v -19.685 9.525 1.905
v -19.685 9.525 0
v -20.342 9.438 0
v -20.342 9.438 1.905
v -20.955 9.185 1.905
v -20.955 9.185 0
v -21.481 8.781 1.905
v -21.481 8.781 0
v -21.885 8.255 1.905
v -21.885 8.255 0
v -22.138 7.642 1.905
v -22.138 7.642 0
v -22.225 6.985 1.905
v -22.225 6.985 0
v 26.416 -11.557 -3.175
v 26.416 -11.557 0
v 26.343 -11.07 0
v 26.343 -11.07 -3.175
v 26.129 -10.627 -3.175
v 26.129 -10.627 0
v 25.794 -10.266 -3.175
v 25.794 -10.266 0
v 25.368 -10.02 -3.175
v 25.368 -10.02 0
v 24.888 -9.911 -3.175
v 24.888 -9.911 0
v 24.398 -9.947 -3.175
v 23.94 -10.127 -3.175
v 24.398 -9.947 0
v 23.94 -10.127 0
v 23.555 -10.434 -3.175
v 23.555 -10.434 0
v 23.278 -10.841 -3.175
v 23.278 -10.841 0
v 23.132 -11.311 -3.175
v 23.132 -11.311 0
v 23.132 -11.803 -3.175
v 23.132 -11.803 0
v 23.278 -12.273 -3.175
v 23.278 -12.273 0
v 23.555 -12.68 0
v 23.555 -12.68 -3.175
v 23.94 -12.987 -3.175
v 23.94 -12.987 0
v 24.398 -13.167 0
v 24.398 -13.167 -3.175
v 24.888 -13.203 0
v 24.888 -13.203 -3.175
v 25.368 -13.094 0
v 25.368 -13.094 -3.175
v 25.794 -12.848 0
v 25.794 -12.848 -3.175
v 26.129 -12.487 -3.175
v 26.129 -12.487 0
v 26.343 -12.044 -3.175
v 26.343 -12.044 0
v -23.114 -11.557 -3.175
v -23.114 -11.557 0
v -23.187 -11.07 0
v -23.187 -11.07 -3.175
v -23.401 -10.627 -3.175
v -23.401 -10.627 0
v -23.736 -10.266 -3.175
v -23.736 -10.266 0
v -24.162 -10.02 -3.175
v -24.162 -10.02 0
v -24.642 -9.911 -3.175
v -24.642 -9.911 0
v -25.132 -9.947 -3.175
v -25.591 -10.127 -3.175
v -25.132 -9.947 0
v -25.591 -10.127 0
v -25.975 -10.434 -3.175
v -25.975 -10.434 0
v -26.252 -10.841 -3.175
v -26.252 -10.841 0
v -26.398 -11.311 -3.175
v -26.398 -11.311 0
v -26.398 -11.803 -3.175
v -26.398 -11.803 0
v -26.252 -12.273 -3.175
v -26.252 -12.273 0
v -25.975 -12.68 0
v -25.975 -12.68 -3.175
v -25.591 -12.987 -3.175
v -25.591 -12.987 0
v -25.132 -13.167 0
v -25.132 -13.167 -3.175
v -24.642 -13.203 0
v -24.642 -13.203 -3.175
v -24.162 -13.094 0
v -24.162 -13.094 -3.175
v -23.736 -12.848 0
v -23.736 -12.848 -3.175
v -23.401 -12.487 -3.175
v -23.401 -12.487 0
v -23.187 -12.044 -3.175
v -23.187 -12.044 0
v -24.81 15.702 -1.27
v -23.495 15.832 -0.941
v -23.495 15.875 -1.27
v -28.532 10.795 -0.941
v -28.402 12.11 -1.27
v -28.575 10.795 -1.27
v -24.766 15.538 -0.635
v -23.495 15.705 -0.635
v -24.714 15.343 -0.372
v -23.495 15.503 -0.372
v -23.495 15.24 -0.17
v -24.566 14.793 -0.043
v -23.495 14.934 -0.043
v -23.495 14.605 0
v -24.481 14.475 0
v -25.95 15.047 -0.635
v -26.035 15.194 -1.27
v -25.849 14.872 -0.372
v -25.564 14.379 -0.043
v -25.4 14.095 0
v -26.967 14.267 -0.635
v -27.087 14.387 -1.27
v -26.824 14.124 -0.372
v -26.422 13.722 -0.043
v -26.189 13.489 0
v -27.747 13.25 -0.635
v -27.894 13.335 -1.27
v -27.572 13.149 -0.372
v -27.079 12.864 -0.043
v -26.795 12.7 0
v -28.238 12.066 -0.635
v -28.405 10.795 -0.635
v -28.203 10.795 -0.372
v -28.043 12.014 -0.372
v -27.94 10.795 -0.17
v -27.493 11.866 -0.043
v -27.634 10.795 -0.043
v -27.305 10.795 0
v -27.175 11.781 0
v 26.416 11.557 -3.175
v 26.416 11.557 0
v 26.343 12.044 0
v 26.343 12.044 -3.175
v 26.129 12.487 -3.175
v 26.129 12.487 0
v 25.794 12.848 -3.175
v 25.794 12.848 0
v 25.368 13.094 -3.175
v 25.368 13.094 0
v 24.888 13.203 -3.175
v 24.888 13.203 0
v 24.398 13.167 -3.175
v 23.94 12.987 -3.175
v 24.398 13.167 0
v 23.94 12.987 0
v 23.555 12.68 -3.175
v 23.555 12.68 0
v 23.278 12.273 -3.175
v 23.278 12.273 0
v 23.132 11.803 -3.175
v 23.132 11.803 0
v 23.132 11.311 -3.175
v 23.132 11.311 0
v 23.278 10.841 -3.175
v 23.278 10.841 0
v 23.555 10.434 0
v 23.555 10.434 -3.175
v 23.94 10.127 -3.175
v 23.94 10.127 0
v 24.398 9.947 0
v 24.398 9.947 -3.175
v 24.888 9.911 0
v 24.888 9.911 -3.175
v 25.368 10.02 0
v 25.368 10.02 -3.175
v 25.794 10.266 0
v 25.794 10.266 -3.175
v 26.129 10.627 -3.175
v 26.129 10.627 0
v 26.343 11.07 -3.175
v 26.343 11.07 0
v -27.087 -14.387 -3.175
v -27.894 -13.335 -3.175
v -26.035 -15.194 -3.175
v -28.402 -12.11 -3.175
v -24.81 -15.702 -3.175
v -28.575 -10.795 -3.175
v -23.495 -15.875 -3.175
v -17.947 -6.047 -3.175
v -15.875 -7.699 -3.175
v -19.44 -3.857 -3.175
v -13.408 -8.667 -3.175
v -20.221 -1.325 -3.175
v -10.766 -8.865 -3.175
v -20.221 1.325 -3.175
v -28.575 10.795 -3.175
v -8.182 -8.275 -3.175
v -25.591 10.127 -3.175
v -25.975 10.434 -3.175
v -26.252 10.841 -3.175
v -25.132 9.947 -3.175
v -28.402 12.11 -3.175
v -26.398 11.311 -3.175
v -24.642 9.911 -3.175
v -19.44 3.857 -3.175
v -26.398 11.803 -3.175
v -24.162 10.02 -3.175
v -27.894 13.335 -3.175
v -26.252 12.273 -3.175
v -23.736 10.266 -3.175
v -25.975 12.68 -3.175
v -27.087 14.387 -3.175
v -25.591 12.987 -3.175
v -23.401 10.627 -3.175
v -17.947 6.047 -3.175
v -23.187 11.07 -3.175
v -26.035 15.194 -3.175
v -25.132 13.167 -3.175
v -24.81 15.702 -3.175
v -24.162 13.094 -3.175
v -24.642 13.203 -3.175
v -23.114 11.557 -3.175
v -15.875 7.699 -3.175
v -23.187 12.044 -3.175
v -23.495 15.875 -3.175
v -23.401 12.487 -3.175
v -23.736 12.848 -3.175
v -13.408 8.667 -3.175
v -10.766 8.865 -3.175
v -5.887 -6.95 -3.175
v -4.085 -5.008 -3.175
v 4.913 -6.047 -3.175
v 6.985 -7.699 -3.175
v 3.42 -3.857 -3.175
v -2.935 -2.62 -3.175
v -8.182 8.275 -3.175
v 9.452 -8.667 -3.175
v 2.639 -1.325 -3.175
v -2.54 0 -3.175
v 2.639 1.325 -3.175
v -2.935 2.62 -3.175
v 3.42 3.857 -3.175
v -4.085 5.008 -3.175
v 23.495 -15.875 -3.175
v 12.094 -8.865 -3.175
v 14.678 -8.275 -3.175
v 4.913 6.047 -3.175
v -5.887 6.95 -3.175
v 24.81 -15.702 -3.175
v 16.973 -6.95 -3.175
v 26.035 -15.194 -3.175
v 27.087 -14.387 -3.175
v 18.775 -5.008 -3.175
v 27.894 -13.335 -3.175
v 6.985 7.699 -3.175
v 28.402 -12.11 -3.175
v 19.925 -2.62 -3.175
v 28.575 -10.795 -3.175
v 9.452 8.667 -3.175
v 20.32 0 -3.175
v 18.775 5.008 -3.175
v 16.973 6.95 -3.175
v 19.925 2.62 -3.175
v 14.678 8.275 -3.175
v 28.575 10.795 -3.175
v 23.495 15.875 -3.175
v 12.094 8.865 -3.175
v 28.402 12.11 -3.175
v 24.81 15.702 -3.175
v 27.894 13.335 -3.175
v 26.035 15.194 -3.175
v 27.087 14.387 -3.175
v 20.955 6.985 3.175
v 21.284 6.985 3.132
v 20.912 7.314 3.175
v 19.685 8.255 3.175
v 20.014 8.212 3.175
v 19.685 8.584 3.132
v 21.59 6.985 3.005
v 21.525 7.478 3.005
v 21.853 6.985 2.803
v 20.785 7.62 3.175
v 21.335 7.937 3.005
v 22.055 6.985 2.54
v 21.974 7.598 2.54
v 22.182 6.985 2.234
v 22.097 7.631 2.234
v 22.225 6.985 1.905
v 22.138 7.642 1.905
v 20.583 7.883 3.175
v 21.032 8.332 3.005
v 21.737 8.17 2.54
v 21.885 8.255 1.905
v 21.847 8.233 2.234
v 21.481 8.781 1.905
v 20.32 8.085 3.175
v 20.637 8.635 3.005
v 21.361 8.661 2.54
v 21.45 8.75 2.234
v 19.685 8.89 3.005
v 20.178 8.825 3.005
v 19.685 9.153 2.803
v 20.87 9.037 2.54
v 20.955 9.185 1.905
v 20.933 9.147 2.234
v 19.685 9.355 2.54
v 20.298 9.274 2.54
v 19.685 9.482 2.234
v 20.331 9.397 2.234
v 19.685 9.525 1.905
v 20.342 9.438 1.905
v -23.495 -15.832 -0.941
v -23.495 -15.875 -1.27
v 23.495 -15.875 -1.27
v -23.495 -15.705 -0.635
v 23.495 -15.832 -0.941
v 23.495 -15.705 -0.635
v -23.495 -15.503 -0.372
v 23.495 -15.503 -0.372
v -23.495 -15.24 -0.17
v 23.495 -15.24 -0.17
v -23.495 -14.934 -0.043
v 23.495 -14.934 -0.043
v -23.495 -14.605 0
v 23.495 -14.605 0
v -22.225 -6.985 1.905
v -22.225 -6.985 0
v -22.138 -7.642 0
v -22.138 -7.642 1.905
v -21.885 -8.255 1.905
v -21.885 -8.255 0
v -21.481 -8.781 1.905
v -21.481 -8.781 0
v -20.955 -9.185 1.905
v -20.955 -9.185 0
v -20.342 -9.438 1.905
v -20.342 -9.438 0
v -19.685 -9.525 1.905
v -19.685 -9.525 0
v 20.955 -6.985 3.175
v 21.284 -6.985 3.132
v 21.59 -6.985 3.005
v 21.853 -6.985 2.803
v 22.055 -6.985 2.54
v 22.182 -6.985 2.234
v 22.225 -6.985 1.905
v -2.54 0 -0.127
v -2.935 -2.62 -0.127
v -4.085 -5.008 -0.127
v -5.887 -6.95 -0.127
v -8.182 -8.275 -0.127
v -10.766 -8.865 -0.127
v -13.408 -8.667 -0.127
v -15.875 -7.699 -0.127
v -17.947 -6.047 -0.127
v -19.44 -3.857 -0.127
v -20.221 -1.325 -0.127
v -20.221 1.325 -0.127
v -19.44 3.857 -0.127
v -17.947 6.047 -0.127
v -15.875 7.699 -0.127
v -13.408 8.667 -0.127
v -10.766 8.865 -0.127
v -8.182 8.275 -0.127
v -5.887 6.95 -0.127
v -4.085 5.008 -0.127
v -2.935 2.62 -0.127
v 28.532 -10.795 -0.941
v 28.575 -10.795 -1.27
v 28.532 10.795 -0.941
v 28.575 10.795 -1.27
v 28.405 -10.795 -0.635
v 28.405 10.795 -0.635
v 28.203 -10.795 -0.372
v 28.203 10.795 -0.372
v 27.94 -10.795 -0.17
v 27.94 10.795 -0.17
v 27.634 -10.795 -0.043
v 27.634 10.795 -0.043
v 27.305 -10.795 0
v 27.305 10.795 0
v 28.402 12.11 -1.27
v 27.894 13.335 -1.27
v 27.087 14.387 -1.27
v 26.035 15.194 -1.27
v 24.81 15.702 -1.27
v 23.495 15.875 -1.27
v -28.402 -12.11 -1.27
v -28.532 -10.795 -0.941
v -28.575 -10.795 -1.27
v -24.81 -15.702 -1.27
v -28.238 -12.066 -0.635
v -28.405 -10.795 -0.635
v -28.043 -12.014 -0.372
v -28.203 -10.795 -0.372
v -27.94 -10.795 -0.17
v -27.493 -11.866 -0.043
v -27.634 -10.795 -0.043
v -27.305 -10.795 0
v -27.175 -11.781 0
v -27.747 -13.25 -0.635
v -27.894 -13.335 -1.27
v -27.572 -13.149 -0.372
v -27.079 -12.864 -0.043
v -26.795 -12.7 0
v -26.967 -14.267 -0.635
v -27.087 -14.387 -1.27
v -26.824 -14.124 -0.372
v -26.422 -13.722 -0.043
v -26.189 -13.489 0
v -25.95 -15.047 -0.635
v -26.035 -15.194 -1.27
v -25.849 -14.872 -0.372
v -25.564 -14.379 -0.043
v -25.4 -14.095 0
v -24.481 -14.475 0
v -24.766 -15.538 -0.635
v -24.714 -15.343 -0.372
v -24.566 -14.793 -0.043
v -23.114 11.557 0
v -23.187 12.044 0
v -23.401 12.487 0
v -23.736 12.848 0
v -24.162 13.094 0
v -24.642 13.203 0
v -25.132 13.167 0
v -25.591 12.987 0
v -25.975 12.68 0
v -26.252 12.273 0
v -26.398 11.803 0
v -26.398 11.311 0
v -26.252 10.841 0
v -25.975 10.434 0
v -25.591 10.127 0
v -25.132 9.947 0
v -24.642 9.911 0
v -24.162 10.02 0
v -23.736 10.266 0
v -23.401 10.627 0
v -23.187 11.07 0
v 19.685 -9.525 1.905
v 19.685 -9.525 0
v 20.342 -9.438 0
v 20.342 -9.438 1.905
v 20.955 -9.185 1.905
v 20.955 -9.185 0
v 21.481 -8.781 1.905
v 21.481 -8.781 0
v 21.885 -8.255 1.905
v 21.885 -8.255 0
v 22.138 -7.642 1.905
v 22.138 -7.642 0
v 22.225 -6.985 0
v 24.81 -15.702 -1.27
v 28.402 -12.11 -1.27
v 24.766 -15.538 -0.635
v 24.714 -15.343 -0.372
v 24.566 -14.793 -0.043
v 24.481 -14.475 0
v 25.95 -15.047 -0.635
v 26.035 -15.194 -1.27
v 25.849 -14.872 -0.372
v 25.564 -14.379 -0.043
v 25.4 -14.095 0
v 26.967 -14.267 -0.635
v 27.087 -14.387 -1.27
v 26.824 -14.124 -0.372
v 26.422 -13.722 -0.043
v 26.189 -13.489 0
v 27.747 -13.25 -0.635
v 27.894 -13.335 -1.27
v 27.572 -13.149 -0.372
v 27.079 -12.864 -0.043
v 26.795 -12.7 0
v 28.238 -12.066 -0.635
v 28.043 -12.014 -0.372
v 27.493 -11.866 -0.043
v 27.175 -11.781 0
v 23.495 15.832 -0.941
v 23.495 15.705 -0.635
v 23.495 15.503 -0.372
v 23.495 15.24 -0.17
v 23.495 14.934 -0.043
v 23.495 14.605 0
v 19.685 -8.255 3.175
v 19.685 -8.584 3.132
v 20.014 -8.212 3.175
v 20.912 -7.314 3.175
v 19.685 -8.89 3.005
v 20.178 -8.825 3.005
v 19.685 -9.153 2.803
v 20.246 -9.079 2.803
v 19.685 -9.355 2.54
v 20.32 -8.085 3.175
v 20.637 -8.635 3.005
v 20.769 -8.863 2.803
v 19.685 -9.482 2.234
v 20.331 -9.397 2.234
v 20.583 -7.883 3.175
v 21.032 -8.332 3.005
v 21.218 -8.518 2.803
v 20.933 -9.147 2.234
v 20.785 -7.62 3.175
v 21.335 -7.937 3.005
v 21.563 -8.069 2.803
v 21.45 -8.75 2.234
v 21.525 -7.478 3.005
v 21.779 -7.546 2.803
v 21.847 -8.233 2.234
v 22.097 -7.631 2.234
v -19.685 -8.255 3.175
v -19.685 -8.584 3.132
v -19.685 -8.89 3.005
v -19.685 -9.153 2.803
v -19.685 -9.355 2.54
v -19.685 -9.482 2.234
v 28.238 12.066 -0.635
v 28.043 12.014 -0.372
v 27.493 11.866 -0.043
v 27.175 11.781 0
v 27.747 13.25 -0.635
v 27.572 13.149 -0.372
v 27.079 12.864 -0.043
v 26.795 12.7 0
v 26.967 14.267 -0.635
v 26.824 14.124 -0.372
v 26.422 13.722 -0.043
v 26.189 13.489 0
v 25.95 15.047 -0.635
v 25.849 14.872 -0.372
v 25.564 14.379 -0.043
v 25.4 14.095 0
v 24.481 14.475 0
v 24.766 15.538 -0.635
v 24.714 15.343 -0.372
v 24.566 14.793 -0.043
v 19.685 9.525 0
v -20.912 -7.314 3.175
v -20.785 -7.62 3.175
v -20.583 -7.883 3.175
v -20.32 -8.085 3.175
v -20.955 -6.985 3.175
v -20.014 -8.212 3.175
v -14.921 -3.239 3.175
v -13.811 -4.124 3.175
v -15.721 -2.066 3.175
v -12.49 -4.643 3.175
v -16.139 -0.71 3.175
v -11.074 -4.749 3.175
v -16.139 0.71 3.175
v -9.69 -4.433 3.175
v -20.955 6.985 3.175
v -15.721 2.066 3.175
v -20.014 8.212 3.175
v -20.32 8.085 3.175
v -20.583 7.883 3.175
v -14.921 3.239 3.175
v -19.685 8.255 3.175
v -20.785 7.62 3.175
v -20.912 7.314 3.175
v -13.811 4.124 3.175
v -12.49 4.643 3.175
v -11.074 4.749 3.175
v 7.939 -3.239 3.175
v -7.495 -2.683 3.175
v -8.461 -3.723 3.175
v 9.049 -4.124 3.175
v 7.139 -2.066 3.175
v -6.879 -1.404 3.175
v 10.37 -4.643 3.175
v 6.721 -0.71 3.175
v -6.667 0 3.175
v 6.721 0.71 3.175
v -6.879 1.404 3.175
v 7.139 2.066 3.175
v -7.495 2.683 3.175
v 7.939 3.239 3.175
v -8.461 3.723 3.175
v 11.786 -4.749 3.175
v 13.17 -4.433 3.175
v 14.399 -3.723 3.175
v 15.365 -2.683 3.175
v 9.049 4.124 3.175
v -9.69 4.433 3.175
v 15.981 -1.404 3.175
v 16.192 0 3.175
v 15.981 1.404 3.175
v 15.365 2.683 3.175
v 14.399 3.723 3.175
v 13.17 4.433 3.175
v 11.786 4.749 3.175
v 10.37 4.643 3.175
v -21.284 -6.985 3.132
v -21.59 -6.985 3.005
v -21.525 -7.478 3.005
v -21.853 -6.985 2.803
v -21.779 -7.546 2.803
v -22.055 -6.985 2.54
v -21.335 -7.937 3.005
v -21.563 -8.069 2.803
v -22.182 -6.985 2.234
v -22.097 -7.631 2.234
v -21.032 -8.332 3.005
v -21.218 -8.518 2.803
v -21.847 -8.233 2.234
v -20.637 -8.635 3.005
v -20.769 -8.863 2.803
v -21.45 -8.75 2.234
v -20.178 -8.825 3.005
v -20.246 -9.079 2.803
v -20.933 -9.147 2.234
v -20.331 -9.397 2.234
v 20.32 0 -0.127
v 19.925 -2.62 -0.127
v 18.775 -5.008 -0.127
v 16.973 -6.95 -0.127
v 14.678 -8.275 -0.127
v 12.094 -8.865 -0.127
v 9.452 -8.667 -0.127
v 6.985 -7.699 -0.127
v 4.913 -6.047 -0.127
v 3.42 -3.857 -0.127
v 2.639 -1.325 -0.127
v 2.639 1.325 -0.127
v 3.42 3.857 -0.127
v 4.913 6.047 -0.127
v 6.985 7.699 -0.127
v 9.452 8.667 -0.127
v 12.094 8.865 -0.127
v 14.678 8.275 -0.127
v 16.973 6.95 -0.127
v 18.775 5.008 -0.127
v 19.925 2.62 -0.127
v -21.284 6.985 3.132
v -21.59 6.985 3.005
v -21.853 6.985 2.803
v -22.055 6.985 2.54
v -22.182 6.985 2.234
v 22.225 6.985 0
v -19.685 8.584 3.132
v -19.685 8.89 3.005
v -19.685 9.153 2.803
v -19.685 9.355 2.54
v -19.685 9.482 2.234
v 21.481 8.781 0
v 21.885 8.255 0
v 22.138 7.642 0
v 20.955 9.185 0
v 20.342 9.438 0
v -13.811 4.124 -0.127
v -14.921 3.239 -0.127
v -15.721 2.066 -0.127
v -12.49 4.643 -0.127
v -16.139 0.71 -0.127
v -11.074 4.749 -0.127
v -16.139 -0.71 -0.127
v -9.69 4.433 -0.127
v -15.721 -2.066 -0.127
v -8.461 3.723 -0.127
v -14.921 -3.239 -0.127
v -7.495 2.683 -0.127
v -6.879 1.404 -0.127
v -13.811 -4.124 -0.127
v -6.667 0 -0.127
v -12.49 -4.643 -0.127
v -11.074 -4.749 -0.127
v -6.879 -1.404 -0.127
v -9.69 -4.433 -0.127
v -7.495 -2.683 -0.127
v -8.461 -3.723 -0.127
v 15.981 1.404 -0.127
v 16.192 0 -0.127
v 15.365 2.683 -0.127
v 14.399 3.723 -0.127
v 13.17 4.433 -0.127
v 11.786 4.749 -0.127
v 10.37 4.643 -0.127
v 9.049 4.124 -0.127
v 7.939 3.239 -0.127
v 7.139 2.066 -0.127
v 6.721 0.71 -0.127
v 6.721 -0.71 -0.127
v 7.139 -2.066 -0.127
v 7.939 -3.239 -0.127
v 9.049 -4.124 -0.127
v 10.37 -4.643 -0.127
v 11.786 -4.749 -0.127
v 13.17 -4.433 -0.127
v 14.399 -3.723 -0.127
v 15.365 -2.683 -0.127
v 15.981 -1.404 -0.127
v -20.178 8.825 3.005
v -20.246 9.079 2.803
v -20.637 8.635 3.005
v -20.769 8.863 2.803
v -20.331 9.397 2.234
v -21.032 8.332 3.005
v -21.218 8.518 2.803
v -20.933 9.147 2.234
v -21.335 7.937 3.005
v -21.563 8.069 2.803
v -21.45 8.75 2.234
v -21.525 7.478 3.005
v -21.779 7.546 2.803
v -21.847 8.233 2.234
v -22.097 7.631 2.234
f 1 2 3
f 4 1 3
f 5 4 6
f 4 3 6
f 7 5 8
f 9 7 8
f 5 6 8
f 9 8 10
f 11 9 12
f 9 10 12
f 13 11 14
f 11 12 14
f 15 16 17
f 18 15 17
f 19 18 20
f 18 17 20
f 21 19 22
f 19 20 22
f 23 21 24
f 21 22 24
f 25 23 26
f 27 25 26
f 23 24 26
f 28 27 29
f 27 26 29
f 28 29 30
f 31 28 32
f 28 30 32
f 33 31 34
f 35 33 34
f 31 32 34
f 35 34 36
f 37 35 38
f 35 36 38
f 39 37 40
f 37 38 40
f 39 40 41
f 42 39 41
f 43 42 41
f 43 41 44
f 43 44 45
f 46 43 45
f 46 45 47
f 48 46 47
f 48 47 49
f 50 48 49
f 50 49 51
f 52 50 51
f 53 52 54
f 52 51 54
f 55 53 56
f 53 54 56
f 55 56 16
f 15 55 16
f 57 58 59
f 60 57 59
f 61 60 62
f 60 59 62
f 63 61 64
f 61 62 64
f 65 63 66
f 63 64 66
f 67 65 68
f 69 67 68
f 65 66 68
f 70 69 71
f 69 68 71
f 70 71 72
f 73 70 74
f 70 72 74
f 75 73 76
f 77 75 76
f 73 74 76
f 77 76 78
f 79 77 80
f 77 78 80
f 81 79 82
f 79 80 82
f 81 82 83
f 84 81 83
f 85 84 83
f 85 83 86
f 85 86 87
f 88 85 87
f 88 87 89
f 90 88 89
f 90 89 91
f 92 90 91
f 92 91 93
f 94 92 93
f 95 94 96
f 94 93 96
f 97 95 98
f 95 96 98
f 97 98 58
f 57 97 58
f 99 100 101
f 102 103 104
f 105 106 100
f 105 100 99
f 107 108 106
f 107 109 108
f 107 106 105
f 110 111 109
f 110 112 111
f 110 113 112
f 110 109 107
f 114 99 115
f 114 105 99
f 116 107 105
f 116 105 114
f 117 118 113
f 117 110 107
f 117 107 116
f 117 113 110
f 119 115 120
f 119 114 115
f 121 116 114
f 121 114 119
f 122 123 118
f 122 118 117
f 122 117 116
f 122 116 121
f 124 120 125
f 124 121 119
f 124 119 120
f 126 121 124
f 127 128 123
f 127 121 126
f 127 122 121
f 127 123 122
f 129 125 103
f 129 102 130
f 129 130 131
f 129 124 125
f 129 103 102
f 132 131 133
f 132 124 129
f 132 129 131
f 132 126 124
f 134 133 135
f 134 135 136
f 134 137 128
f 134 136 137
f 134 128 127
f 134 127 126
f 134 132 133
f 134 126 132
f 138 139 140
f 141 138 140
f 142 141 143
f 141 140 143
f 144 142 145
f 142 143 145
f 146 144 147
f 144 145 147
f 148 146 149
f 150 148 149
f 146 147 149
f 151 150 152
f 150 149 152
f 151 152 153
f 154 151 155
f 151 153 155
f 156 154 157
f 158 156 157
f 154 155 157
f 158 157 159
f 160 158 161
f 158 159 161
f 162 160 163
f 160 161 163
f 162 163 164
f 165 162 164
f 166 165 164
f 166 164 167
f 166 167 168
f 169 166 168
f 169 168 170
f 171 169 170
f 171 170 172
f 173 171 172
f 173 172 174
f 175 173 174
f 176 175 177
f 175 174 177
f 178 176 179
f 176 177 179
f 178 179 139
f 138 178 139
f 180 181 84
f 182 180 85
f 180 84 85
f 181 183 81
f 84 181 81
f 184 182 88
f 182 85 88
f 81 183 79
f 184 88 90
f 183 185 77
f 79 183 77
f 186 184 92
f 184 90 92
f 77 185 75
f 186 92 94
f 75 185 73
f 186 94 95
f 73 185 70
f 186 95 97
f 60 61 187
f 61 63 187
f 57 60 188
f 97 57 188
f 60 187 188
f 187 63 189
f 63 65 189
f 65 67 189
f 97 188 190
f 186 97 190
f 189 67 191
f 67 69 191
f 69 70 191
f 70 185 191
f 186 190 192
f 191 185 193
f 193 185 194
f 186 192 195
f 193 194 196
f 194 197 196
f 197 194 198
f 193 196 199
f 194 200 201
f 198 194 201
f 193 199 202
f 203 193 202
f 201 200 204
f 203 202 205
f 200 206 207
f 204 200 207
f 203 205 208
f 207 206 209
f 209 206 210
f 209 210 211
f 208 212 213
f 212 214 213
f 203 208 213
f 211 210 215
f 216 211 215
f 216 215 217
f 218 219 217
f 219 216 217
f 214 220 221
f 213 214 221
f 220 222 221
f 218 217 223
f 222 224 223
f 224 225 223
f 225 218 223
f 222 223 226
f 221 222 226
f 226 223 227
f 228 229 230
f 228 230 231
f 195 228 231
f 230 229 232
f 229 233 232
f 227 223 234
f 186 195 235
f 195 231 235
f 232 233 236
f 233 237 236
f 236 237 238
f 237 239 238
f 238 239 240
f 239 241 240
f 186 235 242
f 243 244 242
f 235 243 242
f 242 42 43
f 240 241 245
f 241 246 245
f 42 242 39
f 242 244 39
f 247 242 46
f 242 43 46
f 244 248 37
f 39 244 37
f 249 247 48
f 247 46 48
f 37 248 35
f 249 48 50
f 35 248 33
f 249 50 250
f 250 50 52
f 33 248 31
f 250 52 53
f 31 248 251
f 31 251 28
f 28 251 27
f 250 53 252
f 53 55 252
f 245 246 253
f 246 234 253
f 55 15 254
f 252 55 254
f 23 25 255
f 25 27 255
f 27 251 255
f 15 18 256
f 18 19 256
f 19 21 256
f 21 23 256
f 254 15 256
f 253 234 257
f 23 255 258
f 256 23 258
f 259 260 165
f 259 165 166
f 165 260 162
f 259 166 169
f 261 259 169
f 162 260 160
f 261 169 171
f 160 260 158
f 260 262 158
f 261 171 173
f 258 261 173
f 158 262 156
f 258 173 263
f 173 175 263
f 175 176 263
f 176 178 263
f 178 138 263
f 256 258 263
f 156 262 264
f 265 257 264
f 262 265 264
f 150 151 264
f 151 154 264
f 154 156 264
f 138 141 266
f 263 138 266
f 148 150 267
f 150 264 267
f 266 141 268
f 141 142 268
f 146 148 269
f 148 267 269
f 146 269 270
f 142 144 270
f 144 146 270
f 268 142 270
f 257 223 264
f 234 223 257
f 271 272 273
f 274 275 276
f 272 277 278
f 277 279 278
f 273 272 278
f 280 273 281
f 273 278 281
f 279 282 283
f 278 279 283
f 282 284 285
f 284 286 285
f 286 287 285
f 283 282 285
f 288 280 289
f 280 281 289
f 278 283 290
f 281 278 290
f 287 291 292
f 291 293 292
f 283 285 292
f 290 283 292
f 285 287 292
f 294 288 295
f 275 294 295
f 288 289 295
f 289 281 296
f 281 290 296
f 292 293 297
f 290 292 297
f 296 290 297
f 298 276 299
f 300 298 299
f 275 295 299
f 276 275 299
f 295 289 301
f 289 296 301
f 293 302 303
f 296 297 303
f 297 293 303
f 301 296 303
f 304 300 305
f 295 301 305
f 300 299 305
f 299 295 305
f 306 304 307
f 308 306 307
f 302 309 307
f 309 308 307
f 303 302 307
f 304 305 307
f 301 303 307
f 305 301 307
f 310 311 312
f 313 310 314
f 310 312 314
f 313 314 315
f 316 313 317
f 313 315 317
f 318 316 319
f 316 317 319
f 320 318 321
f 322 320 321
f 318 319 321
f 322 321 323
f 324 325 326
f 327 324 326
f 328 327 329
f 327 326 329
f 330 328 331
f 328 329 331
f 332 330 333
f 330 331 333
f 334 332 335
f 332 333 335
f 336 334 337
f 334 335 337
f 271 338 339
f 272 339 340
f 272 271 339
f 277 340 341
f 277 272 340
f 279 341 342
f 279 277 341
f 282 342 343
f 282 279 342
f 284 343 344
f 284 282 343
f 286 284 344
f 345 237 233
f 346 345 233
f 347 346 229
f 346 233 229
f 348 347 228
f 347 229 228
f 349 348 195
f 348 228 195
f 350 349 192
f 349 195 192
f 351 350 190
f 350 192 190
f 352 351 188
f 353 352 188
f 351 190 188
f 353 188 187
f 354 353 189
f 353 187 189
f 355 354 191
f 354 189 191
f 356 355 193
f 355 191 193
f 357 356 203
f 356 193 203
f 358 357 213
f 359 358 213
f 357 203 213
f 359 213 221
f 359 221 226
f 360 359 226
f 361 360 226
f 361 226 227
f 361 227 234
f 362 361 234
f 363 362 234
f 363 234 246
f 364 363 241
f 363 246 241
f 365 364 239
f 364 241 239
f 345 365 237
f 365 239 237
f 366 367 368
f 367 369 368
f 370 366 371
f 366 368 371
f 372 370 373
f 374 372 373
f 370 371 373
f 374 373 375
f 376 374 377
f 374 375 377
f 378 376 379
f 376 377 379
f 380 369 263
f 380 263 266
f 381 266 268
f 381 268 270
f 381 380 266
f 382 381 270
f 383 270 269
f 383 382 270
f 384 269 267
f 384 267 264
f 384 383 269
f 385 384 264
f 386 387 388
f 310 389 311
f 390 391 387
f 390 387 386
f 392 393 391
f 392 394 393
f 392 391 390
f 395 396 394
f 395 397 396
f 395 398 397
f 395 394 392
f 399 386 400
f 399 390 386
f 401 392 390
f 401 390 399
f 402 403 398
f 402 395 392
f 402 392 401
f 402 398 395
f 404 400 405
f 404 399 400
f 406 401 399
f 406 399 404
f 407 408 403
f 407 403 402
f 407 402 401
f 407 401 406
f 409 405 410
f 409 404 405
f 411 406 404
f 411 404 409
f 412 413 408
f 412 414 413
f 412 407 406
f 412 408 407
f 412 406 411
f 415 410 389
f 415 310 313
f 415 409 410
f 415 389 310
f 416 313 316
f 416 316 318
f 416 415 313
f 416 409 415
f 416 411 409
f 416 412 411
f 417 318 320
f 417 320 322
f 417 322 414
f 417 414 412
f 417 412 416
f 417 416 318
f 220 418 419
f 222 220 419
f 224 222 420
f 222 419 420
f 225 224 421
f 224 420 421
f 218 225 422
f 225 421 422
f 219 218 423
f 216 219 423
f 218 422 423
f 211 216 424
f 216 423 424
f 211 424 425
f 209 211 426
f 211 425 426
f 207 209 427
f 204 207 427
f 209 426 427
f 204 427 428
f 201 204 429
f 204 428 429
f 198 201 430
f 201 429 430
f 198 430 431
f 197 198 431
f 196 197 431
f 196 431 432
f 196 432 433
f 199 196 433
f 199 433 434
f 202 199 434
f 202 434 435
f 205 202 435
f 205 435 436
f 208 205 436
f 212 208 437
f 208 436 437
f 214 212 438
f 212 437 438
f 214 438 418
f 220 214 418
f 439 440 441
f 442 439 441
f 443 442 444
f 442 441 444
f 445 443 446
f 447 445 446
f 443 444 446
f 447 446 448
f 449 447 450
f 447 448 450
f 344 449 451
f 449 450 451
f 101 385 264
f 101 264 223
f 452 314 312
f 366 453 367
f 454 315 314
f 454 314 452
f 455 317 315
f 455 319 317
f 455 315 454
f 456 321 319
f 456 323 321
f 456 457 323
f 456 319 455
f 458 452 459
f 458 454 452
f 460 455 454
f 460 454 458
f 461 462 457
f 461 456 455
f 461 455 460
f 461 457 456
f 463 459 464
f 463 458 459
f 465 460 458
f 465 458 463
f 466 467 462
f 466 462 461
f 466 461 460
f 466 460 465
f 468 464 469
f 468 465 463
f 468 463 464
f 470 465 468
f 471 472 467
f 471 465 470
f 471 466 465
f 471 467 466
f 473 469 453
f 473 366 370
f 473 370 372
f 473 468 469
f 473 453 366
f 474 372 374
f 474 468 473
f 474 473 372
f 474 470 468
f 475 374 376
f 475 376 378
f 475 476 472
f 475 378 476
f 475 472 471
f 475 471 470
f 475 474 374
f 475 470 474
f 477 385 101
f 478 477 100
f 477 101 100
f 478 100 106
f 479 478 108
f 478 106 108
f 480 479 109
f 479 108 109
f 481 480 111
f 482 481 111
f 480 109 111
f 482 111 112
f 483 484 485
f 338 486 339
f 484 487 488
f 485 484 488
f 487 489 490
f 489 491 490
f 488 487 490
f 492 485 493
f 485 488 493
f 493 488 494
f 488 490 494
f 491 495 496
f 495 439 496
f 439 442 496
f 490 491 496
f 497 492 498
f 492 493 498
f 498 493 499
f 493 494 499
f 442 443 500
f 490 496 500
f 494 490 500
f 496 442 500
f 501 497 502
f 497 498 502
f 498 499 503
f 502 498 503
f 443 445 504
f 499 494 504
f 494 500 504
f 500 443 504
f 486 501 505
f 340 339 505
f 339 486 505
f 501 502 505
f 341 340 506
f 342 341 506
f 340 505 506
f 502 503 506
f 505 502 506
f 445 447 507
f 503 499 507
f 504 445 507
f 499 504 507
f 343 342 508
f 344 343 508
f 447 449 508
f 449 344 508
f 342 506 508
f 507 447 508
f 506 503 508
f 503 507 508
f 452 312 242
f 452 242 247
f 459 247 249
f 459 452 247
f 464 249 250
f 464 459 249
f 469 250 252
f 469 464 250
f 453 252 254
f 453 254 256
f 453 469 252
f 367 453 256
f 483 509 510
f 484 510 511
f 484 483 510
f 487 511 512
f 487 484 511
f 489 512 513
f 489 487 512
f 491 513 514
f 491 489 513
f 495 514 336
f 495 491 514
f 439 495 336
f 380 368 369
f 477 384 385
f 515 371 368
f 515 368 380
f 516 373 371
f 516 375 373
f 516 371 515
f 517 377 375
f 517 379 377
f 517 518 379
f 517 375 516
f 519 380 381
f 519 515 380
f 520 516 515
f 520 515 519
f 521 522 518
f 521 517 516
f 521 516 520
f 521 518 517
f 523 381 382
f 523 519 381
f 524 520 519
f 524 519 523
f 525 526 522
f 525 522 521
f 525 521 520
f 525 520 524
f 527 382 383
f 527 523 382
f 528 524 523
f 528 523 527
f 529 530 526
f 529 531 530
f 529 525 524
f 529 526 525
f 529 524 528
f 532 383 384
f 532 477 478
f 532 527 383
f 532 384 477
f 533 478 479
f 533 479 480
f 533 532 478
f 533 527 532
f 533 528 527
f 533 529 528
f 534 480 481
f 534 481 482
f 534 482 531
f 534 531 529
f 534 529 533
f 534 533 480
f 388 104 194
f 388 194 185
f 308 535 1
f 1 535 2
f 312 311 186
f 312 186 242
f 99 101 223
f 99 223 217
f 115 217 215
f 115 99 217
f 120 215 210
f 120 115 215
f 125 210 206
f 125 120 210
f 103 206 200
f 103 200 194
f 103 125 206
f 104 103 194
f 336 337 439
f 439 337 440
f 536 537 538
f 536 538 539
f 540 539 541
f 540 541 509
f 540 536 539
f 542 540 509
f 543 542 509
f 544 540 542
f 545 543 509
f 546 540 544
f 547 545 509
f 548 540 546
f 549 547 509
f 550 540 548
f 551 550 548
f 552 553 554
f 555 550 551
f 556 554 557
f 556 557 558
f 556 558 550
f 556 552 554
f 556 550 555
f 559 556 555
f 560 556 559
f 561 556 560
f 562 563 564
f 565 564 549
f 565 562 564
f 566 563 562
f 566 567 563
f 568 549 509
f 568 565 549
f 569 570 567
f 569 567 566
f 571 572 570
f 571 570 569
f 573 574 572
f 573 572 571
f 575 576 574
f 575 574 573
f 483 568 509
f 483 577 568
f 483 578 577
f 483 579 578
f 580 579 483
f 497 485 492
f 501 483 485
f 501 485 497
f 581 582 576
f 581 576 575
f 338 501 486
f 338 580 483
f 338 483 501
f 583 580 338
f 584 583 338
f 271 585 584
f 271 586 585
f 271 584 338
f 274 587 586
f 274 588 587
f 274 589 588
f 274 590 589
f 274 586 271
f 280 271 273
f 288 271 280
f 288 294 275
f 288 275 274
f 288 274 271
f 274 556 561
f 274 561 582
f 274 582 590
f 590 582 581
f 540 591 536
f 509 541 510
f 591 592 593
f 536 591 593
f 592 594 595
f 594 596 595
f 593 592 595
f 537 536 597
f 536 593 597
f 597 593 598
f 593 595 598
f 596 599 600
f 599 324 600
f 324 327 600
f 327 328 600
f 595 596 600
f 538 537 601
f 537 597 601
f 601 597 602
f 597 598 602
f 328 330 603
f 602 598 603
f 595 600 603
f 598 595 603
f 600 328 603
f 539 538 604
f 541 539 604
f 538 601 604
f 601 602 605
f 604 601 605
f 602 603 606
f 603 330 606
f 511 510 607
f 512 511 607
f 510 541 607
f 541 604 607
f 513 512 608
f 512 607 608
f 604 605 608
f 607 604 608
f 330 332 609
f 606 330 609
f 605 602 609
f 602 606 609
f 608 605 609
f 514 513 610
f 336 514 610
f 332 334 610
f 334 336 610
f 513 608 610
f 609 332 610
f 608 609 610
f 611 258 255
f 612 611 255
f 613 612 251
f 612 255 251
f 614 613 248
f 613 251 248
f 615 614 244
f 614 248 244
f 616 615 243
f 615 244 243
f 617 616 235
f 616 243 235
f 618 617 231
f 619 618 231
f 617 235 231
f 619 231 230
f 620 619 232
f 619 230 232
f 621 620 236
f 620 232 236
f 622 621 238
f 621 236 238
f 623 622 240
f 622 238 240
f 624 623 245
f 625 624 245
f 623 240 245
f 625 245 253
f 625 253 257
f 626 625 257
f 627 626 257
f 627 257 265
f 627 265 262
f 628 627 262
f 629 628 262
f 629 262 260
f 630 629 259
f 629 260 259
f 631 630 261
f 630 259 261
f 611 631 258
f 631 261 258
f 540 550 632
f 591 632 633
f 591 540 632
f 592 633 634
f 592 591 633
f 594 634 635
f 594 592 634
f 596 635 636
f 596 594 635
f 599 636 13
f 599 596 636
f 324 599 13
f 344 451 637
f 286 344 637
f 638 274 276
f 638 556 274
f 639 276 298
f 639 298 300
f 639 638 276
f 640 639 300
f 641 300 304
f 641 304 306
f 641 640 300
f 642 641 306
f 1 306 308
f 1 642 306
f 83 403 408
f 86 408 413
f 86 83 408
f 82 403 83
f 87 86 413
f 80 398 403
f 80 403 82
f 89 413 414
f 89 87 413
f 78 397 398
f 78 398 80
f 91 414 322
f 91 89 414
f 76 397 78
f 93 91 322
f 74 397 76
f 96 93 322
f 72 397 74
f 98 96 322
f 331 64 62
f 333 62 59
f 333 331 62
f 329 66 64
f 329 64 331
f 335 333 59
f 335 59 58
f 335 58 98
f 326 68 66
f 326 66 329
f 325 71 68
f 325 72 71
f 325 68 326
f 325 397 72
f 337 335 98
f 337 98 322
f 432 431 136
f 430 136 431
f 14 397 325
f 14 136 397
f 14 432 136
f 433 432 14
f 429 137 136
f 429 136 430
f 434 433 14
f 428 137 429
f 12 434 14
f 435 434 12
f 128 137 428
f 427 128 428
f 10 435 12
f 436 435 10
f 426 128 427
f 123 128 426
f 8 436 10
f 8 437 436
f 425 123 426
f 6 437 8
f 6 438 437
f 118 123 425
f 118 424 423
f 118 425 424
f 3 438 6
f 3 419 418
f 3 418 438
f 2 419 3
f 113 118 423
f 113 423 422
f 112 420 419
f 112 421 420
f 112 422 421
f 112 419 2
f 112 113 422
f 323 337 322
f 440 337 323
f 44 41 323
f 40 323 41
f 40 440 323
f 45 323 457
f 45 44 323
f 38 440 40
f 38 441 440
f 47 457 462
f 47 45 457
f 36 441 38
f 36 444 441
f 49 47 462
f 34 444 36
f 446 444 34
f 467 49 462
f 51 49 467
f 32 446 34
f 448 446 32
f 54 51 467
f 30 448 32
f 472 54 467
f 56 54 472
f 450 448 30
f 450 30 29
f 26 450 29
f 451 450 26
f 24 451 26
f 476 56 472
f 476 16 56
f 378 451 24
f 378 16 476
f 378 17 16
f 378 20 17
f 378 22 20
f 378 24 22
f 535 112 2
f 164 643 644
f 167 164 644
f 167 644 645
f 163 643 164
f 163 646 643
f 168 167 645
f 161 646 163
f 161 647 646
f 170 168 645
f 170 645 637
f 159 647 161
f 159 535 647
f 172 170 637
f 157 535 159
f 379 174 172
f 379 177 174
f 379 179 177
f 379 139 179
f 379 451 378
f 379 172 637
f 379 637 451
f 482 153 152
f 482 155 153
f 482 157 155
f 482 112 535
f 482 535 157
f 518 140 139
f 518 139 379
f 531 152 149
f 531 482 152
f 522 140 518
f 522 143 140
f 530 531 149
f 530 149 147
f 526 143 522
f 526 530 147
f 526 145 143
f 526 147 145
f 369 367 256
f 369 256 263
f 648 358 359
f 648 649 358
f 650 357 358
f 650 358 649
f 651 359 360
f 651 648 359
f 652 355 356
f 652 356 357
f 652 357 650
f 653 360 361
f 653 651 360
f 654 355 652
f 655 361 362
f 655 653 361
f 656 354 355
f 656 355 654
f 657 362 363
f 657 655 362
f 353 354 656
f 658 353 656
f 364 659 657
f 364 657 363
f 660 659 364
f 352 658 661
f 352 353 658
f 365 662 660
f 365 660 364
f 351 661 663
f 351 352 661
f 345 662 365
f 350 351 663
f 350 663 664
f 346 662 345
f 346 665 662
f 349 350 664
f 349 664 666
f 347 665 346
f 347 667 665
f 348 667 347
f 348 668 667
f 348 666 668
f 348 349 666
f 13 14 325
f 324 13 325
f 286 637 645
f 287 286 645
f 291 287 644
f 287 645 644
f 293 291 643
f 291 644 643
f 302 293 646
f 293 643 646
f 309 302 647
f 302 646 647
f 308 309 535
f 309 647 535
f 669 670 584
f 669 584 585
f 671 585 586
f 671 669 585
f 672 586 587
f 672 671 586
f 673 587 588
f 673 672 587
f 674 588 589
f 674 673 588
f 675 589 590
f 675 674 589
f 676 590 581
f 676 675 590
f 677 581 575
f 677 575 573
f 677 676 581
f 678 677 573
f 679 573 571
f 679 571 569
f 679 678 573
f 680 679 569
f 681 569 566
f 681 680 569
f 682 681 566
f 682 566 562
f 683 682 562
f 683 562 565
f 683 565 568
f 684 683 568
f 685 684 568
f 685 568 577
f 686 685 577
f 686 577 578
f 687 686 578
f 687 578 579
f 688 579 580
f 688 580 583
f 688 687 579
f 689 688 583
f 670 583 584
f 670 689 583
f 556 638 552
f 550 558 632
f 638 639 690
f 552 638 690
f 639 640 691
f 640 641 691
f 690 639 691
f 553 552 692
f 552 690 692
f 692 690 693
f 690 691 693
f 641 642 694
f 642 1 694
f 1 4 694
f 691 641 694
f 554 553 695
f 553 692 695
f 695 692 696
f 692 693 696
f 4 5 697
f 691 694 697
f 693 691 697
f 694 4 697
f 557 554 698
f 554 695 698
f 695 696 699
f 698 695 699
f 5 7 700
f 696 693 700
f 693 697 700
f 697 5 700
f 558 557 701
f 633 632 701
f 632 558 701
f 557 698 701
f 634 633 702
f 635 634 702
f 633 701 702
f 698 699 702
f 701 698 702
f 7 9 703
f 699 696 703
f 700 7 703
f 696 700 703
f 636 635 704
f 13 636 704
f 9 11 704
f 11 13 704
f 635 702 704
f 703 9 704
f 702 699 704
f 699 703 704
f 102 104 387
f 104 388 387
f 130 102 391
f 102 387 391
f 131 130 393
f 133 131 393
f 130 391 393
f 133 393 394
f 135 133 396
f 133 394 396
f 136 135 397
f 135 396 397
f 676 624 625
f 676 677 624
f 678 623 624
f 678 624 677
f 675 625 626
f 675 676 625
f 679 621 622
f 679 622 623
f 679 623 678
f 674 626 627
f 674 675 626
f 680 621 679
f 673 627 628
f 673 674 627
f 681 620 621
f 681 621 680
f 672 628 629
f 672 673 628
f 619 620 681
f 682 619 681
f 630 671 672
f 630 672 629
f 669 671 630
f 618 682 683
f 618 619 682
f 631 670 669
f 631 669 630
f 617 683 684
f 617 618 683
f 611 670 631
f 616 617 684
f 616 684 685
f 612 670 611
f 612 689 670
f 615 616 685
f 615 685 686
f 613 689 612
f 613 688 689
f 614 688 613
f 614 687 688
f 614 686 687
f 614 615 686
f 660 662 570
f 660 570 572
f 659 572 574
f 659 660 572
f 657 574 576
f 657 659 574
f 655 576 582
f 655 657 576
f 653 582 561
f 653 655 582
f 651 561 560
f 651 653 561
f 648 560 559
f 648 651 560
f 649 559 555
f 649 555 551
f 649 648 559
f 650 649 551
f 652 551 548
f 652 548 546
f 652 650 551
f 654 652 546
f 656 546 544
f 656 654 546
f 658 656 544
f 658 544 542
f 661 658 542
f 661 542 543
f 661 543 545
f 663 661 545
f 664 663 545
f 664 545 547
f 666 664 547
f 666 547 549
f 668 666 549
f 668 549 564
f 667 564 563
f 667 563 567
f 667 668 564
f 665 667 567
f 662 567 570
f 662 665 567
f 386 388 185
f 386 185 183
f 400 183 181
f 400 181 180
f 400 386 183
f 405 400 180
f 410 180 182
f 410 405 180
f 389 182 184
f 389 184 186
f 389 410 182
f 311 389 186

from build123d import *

# Parameters (mm, degrees)
F0_R     = 1.651
F0_R_2   = 4.7625
F1_DEPTH = 3.175
F2_DEPTH = 3.175
F3_R     = 1.27
F4_R     = 8.89
F5_DEPTH = 3.048


with BuildPart() as f1:
    # F0 (on Top) → F1 (new body)
    with BuildSketch(Plane.XY):
        with BuildLine():
            Line((-23.495, -15.875), (23.495, -15.875))
            ThreePointArc((23.495, -15.875), (27.087102, -14.387102), (28.575, -10.795))
            Line((28.575, -10.795), (28.575, 10.795))
            ThreePointArc((28.575, 10.795), (27.087102, 14.387102), (23.495, 15.875))
            Line((23.495, 15.875), (-23.495, 15.875))
            ThreePointArc((-23.495, 15.875), (-27.087102, 14.387102), (-28.575, 10.795))
            Line((-28.575, 10.795), (-28.575, -10.795))
            ThreePointArc((-28.575, -10.795), (-27.087102, -14.387102), (-23.495, -15.875))
        make_face()
        with Locations((-24.765, -11.557)):
            Circle(F0_R, mode=Mode.SUBTRACT)
        with Locations((24.765, -11.557)):
            Circle(F0_R, mode=Mode.SUBTRACT)
        with Locations((-24.765, 11.557)):
            Circle(F0_R, mode=Mode.SUBTRACT)
        with BuildLine():
            Line((-19.685, 9.525), (19.685, 9.525))
            ThreePointArc((19.685, 9.525), (21.481051, 8.781051), (22.225, 6.985))
            Line((22.225, 6.985), (22.225, -6.985))
            ThreePointArc((22.225, -6.985), (21.481051, -8.781051), (19.685, -9.525))
            Line((19.685, -9.525), (-19.685, -9.525))
            ThreePointArc((-19.685, -9.525), (-21.481051, -8.781051), (-22.225, -6.985))
            Line((-22.225, -6.985), (-22.225, 6.985))
            ThreePointArc((-22.225, 6.985), (-21.481051, 8.781051), (-19.685, 9.525))
        make_face(mode=Mode.SUBTRACT)
        with Locations((24.765, 11.557)):
            Circle(F0_R, mode=Mode.SUBTRACT)
        with BuildLine():
            ThreePointArc((22.225, 6.985), (21.481051, 8.781051), (19.685, 9.525))
            Line((19.685, 9.525), (-19.685, 9.525))
            ThreePointArc((-19.685, 9.525), (-21.481051, 8.781051), (-22.225, 6.985))
            Line((-22.225, 6.985), (-22.225, -6.985))
            ThreePointArc((-22.225, -6.985), (-21.481051, -8.781051), (-19.685, -9.525))
            Line((-19.685, -9.525), (19.685, -9.525))
            ThreePointArc((19.685, -9.525), (21.481051, -8.781051), (22.225, -6.985))
            Line((22.225, -6.985), (22.225, 6.985))
        make_face()
        with Locations((-11.43, 0)):
            Circle(F0_R_2, mode=Mode.SUBTRACT)
        with Locations((11.43, 0)):
            Circle(F0_R_2, mode=Mode.SUBTRACT)
    extrude(amount=-F1_DEPTH)

    # F0 (on Top) → F2 (join)
    with BuildSketch(Plane.XY):
        with BuildLine():
            ThreePointArc((22.225, 6.985), (21.481051, 8.781051), (19.685, 9.525))
            Line((19.685, 9.525), (-19.685, 9.525))
            ThreePointArc((-19.685, 9.525), (-21.481051, 8.781051), (-22.225, 6.985))
            Line((-22.225, 6.985), (-22.225, -6.985))
            ThreePointArc((-22.225, -6.985), (-21.481051, -8.781051), (-19.685, -9.525))
            Line((-19.685, -9.525), (19.685, -9.525))
            ThreePointArc((19.685, -9.525), (21.481051, -8.781051), (22.225, -6.985))
            Line((22.225, -6.985), (22.225, 6.985))
        make_face()
        with Locations((-11.43, 0)):
            Circle(F0_R_2, mode=Mode.SUBTRACT)
        with Locations((11.43, 0)):
            Circle(F0_R_2, mode=Mode.SUBTRACT)
    extrude(amount=F2_DEPTH)

    # F3
    f3_edges = [f1.edges().sort_by_distance(p)[0] for p in [
        (0, 9.525, 3.175),
        (0, 15.875, 0),
    ]]
    fillet(f3_edges, radius=F3_R)

    # F4 (on face) → F5 (cut)
    with BuildSketch(Plane(origin=(0, 0, -3.175), x_dir=(1, 0, 0), z_dir=(0, 0, -1))):
        with Locations((-11.43, 0)):
            Circle(F4_R)
        with Locations((11.43, 0)):
            Circle(F4_R)
    extrude(amount=-F5_DEPTH, mode=Mode.SUBTRACT)


solid = f1.part
